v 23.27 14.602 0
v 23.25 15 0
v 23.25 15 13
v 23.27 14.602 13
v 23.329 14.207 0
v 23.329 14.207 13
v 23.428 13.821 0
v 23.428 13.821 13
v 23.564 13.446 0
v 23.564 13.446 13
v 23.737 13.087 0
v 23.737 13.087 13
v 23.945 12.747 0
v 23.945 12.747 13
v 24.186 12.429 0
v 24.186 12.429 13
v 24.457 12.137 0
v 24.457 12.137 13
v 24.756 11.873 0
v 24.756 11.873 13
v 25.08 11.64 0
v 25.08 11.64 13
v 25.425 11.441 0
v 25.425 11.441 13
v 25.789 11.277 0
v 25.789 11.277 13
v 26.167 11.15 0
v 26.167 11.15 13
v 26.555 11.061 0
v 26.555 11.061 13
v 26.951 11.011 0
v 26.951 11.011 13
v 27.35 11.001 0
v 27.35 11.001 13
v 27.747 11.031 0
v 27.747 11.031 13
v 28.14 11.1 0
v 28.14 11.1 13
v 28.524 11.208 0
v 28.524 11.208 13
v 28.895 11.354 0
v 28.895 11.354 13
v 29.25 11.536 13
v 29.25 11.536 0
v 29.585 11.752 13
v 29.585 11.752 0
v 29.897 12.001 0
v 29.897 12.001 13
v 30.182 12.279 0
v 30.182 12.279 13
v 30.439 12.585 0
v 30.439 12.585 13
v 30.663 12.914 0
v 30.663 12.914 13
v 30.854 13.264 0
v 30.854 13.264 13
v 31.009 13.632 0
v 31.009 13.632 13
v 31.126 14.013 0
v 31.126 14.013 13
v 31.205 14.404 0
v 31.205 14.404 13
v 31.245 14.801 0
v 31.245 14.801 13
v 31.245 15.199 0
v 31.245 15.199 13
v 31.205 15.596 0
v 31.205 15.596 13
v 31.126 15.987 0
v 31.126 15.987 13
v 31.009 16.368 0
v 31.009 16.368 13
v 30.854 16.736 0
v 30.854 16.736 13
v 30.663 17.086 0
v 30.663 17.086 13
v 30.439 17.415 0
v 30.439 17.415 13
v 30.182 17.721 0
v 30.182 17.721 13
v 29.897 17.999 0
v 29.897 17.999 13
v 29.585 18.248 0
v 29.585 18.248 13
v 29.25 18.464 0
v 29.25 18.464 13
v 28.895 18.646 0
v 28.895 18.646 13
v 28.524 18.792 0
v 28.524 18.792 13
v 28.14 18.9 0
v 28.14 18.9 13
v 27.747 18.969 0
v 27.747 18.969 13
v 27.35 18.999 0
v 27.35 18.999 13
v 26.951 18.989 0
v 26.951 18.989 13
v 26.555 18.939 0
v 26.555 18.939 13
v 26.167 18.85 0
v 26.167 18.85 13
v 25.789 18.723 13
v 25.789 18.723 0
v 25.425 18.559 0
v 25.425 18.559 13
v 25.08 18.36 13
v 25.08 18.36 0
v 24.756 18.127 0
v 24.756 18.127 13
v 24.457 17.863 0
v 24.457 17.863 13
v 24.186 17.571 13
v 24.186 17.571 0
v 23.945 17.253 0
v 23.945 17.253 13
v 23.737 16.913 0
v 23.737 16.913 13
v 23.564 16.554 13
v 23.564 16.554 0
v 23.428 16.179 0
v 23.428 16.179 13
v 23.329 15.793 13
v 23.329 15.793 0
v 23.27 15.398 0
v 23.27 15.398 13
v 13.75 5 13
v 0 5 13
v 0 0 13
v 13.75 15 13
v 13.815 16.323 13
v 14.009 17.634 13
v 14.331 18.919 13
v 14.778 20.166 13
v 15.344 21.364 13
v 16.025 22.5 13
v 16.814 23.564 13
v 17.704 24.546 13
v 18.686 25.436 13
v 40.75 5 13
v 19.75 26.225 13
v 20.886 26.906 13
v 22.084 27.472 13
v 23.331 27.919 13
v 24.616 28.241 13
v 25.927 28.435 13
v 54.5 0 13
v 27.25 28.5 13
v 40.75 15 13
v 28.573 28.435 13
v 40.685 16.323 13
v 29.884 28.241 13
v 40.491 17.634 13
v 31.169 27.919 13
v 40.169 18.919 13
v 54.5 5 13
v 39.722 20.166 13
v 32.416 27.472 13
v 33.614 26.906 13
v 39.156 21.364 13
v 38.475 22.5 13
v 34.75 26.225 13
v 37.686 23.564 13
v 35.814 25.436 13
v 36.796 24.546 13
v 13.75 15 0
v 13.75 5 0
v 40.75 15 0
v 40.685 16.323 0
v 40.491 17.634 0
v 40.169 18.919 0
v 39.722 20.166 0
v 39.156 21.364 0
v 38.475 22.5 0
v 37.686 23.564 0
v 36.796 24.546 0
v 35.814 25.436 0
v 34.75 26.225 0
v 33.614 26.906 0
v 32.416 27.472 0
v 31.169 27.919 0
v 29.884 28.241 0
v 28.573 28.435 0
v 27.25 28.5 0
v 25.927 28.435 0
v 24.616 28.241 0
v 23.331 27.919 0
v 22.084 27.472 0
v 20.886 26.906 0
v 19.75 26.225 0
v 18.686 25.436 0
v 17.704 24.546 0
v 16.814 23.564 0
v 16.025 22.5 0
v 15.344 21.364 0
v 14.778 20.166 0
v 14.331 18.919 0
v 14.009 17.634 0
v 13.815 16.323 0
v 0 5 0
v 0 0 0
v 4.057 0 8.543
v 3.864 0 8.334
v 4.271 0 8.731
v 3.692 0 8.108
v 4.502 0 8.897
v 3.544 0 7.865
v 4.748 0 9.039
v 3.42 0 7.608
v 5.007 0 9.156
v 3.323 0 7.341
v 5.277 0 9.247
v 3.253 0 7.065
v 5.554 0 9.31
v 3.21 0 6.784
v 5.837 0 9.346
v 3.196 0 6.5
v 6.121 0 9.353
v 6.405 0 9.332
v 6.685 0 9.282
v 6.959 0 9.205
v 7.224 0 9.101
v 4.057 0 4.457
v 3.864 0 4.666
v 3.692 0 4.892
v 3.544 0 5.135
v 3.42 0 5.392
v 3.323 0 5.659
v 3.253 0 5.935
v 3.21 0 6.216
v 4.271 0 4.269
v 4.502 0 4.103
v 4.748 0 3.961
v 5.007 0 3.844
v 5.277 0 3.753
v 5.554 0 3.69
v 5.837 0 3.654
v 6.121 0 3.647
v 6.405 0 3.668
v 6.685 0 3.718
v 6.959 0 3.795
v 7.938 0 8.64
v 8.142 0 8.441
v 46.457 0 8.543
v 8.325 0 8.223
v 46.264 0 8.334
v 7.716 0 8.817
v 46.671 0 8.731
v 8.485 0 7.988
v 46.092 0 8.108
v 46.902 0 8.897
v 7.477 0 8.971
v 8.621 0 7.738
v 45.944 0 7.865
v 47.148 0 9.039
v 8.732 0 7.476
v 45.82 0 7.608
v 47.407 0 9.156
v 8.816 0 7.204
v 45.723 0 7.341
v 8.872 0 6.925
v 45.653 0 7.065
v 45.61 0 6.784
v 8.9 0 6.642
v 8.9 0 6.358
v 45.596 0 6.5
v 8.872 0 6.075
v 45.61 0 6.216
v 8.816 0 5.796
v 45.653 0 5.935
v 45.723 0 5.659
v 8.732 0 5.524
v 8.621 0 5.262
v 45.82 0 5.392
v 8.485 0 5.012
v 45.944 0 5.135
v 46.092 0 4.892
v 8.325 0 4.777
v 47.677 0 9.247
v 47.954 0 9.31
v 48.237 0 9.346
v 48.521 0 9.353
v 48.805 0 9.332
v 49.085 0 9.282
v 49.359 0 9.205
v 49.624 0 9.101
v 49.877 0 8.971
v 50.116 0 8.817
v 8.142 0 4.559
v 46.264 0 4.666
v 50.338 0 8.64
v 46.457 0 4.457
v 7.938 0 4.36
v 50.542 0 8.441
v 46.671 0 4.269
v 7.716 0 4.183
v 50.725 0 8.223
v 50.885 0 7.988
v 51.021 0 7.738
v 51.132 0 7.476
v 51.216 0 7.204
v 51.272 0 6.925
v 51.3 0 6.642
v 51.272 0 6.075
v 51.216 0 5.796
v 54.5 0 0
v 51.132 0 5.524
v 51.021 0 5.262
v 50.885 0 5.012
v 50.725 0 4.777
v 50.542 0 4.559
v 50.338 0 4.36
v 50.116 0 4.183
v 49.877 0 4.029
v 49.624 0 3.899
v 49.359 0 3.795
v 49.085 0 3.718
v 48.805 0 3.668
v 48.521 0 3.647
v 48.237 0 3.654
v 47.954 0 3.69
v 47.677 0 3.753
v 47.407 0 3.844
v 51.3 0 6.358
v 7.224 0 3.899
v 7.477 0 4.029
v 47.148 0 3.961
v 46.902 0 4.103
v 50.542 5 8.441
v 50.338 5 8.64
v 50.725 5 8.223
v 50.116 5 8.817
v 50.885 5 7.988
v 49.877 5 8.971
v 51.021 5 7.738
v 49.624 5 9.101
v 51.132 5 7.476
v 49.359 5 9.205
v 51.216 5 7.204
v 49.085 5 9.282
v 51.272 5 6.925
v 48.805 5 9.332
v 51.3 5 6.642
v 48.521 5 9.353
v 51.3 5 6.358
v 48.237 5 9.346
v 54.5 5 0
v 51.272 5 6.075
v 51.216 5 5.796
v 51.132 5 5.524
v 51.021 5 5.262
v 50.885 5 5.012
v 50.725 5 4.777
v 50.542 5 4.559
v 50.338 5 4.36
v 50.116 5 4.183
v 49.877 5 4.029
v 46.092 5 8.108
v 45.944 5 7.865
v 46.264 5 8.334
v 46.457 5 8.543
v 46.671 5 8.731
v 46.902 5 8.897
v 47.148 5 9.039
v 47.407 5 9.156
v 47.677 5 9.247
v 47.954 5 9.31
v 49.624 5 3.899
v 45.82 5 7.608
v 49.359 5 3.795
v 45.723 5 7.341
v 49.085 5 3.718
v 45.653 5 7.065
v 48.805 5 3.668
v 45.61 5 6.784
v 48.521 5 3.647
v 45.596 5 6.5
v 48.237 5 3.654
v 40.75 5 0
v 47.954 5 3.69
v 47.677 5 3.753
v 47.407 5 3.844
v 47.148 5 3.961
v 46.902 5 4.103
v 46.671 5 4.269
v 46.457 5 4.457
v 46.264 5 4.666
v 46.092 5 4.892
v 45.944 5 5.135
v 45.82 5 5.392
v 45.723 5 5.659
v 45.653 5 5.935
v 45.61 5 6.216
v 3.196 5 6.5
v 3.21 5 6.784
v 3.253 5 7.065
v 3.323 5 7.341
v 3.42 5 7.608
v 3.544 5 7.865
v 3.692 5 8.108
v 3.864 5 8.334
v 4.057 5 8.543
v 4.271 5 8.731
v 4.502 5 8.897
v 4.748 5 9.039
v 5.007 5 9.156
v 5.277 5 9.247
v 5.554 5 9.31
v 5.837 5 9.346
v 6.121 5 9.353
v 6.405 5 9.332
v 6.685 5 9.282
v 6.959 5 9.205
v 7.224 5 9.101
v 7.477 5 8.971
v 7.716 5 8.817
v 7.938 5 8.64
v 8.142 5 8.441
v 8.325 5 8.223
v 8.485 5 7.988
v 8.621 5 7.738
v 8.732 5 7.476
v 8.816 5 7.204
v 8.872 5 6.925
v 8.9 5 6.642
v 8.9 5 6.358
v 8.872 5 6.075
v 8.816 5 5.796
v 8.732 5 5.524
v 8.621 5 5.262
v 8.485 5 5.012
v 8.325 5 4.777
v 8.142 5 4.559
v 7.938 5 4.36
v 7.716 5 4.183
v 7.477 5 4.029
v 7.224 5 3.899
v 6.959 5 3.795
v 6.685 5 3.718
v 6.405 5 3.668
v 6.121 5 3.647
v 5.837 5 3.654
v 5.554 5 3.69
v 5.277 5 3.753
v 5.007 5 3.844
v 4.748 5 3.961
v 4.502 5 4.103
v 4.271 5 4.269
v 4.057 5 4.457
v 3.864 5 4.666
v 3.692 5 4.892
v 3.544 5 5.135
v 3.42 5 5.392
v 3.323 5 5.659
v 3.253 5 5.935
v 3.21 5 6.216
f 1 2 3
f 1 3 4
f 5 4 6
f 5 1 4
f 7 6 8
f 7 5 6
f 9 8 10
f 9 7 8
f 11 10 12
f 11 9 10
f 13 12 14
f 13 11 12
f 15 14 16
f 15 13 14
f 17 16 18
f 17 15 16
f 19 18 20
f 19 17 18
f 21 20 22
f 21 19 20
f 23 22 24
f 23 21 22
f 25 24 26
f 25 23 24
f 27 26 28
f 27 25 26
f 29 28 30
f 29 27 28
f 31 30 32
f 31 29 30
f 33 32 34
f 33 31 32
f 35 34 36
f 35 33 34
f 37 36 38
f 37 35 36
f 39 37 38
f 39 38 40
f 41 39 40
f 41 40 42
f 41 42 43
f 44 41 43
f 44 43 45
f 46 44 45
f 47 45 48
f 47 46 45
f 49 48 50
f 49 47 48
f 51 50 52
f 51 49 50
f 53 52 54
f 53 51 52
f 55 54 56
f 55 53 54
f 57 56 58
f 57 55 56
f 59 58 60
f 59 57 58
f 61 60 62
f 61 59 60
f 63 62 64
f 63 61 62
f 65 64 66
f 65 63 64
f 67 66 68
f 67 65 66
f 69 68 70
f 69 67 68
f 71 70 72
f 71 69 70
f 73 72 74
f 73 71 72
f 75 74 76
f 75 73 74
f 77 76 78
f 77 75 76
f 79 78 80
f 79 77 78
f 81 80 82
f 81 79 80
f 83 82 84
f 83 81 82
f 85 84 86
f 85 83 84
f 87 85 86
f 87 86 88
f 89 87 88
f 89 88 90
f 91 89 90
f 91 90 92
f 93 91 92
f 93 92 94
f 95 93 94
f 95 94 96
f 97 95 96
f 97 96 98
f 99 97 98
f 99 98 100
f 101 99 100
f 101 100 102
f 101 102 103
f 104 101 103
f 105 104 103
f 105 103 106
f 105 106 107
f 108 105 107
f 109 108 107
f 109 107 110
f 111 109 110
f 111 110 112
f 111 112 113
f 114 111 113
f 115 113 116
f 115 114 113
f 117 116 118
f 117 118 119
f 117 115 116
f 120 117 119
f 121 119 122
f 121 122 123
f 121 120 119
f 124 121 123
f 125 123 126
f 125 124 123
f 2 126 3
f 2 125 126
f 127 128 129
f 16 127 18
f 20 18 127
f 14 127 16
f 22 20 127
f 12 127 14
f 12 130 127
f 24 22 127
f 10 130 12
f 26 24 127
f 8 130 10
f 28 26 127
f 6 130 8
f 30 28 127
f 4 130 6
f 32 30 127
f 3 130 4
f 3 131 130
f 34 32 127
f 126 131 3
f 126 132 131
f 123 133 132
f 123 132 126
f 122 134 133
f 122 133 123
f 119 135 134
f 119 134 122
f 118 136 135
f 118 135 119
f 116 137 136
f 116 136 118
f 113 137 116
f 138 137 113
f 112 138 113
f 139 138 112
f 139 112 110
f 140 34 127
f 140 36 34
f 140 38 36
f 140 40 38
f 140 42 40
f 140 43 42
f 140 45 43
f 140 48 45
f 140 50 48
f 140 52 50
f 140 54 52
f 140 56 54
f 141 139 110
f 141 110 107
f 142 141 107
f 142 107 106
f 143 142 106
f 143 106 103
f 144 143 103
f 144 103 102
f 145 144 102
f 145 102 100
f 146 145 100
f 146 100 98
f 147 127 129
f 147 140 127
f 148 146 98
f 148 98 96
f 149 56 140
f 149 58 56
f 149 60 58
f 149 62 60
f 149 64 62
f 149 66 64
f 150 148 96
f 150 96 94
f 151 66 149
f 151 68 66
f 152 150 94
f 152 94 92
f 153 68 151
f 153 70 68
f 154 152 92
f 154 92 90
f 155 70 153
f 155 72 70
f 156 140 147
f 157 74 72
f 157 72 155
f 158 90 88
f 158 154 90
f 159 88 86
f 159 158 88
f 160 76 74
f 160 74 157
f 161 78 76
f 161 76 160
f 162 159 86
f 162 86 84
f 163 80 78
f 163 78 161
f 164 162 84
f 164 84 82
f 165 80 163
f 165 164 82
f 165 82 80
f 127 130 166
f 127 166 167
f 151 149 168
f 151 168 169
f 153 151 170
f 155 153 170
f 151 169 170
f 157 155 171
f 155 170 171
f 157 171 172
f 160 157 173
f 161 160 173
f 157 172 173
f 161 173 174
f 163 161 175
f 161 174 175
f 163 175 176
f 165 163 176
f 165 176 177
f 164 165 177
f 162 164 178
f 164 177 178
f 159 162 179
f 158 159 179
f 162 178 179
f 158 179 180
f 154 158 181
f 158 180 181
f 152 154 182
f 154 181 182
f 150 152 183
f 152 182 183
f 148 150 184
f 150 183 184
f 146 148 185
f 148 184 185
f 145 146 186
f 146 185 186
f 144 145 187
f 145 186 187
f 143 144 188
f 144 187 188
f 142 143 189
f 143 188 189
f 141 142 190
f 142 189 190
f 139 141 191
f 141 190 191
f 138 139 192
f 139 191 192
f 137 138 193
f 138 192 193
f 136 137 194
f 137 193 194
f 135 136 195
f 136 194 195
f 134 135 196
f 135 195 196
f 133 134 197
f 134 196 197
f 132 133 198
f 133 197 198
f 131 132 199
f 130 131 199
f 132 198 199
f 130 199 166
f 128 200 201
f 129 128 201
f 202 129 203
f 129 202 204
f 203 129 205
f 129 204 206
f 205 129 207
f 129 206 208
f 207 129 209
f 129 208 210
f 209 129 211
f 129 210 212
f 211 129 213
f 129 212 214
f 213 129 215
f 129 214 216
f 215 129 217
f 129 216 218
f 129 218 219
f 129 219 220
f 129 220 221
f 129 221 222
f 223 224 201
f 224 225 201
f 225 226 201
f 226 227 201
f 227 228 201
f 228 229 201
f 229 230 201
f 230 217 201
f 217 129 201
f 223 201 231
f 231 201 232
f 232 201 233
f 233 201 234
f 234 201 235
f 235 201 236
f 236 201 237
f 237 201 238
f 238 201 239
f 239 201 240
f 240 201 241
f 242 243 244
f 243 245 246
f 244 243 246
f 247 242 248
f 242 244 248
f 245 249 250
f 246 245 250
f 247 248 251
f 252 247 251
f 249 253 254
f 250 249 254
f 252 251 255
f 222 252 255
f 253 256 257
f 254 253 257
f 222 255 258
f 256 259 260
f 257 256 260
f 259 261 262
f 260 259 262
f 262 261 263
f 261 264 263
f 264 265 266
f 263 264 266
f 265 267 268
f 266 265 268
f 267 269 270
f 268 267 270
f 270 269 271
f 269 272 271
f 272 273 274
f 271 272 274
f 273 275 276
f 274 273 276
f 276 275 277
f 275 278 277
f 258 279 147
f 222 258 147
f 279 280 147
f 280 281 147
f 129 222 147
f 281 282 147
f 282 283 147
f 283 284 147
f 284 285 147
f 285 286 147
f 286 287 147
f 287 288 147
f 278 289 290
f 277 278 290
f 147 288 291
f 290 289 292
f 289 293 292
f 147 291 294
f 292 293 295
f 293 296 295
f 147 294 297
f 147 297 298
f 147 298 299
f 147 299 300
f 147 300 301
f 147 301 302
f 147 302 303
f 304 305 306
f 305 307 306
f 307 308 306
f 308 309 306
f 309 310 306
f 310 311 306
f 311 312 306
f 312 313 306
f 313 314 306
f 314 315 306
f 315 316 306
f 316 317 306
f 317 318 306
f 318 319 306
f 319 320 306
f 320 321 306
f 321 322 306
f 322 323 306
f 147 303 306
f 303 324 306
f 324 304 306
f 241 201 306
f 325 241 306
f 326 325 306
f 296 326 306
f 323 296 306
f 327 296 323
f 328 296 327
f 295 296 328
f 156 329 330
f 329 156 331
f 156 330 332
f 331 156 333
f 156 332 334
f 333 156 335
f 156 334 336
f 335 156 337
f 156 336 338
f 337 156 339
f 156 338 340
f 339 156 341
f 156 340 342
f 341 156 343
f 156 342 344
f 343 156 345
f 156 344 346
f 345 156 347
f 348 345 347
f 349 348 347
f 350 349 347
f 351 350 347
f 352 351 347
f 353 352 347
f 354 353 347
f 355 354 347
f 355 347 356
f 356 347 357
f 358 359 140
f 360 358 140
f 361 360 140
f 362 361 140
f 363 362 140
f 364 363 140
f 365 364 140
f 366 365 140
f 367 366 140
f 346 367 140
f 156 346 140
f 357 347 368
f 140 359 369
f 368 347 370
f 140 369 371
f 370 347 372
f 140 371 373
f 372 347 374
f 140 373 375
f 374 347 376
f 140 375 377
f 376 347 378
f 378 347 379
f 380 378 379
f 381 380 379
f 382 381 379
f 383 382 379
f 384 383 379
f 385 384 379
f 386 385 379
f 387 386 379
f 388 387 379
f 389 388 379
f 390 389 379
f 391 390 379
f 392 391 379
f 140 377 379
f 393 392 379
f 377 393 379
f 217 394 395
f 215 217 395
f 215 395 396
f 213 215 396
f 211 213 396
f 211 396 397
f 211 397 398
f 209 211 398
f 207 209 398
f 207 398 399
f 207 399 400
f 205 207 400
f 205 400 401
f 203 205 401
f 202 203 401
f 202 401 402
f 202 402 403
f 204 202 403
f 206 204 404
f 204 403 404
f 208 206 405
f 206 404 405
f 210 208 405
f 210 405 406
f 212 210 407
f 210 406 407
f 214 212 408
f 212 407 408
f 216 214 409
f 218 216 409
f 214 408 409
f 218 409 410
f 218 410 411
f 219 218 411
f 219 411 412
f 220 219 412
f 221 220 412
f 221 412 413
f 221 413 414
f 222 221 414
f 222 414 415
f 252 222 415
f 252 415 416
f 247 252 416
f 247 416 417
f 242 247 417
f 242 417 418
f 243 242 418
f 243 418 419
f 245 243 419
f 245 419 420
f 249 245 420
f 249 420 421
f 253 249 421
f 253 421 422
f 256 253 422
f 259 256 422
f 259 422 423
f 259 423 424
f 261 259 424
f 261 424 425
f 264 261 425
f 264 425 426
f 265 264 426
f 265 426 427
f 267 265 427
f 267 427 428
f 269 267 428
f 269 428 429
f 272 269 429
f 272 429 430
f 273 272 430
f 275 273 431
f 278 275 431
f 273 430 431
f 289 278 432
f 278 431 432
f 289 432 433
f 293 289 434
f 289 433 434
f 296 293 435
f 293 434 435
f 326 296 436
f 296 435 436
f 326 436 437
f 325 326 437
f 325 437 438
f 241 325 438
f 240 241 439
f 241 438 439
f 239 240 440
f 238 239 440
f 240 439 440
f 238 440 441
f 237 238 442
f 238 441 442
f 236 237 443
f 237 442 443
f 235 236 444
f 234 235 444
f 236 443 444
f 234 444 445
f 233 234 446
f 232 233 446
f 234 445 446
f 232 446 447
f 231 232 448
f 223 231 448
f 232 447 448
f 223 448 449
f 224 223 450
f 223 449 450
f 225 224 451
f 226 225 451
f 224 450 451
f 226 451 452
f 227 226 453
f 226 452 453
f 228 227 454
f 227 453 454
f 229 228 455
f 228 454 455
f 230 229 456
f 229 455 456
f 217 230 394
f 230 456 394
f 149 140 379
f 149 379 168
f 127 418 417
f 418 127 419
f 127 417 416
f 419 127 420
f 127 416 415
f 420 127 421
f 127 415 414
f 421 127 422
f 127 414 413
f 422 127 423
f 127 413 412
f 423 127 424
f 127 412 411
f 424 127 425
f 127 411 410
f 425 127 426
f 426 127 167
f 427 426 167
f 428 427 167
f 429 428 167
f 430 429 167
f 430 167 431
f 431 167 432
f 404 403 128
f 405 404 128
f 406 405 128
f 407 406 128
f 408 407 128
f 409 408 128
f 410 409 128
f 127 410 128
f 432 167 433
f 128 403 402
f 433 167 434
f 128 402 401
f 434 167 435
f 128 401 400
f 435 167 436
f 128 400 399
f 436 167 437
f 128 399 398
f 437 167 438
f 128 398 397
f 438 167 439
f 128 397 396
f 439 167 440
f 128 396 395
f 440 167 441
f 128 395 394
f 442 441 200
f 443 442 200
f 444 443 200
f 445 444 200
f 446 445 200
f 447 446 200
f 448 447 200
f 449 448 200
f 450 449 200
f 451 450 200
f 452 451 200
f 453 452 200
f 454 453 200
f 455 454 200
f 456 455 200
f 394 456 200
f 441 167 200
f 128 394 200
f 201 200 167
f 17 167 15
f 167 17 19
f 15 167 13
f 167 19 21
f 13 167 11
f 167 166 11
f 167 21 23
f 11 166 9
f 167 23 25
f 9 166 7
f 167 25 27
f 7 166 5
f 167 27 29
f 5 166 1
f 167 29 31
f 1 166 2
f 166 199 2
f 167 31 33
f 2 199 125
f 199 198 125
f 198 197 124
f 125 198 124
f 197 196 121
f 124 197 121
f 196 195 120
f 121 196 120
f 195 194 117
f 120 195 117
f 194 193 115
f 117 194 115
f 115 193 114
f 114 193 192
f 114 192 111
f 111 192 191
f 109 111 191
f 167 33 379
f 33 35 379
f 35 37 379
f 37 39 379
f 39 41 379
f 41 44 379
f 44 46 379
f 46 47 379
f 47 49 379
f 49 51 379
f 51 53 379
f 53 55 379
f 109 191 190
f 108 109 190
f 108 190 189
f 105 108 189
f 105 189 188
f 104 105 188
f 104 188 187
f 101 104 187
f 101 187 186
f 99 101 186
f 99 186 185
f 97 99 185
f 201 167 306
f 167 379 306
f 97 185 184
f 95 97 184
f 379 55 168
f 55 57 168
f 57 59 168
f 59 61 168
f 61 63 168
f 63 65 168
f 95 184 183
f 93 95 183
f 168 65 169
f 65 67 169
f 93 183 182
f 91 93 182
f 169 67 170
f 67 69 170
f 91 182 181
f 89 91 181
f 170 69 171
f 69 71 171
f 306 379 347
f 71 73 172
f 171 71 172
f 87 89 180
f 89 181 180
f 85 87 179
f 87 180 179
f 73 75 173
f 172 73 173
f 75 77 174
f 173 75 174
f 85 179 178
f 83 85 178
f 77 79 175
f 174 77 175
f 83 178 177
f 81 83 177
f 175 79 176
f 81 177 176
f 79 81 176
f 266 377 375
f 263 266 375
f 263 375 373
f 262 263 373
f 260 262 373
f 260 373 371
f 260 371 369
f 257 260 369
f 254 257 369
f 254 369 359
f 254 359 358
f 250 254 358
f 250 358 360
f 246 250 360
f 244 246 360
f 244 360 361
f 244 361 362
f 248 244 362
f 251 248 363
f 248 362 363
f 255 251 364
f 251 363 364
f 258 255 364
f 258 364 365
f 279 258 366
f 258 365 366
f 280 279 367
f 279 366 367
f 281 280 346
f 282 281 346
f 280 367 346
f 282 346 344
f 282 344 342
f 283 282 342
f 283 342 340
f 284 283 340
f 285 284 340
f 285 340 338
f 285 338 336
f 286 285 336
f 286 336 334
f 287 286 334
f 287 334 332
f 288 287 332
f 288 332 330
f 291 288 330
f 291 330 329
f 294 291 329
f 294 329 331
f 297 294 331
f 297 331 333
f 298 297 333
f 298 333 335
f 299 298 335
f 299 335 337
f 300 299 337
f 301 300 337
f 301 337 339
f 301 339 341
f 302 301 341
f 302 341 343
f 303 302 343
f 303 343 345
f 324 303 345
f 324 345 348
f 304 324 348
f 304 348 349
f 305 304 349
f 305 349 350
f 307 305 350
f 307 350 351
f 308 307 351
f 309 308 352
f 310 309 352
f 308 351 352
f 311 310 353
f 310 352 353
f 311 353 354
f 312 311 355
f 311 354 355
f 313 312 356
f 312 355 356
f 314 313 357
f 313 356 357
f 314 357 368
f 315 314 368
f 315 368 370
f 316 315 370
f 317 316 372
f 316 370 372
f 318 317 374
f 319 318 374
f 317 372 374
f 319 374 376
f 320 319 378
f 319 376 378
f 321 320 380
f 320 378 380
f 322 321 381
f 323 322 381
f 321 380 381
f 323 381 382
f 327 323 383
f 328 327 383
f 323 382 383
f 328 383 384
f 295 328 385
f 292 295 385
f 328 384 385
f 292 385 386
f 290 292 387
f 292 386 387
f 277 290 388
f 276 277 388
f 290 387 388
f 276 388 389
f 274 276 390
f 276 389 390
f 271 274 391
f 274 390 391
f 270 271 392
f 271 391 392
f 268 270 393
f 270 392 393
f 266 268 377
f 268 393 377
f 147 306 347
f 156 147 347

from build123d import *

# Parameters (mm, degrees)
SKETCH1_R           = 4
BOSS_EXTRUDE1_DEPTH = 13
SKETCH2_R           = 2.853745902
CUT_EXTRUDE1_DEPTH  = 13


with BuildPart() as part:
    # Sketch1 → Boss-Extrude1 (new body)
    with BuildSketch(Plane.XY):
        with BuildLine():
            Line((0, 0), (54.5, 0))
            Line((54.5, 0), (54.5, 5))
            Line((54.5, 5), (40.75, 5))
            Line((40.75, 5), (40.75, 15))
            ThreePointArc((40.75, 15), (27.25, 28.5), (13.75, 15))
            Line((13.75, 15), (13.75, 5))
            Line((13.75, 5), (0, 5))
            Line((0, 5), (0, 0))
        make_face()
        with Locations(Location((27.25, 15, 0), (0, 0, 180))):
            Circle(SKETCH1_R, mode=Mode.SUBTRACT)
    extrude(amount=BOSS_EXTRUDE1_DEPTH)

    # Sketch2 → Cut-Extrude1 (cut)
    with BuildSketch(Plane(origin=(0, 5, 0), x_dir=(1, 0, 0), z_dir=(0, 1, 0))):
        with Locations(Location((48.45, -6.5, 0), (0, 0, 180))):
            Circle(SKETCH2_R)
        with Locations(Location((6.05, -6.5, 0), (0, 0, 180))):
            Circle(SKETCH2_R)
    extrude(amount=-CUT_EXTRUDE1_DEPTH, mode=Mode.SUBTRACT)


solid = part.part
